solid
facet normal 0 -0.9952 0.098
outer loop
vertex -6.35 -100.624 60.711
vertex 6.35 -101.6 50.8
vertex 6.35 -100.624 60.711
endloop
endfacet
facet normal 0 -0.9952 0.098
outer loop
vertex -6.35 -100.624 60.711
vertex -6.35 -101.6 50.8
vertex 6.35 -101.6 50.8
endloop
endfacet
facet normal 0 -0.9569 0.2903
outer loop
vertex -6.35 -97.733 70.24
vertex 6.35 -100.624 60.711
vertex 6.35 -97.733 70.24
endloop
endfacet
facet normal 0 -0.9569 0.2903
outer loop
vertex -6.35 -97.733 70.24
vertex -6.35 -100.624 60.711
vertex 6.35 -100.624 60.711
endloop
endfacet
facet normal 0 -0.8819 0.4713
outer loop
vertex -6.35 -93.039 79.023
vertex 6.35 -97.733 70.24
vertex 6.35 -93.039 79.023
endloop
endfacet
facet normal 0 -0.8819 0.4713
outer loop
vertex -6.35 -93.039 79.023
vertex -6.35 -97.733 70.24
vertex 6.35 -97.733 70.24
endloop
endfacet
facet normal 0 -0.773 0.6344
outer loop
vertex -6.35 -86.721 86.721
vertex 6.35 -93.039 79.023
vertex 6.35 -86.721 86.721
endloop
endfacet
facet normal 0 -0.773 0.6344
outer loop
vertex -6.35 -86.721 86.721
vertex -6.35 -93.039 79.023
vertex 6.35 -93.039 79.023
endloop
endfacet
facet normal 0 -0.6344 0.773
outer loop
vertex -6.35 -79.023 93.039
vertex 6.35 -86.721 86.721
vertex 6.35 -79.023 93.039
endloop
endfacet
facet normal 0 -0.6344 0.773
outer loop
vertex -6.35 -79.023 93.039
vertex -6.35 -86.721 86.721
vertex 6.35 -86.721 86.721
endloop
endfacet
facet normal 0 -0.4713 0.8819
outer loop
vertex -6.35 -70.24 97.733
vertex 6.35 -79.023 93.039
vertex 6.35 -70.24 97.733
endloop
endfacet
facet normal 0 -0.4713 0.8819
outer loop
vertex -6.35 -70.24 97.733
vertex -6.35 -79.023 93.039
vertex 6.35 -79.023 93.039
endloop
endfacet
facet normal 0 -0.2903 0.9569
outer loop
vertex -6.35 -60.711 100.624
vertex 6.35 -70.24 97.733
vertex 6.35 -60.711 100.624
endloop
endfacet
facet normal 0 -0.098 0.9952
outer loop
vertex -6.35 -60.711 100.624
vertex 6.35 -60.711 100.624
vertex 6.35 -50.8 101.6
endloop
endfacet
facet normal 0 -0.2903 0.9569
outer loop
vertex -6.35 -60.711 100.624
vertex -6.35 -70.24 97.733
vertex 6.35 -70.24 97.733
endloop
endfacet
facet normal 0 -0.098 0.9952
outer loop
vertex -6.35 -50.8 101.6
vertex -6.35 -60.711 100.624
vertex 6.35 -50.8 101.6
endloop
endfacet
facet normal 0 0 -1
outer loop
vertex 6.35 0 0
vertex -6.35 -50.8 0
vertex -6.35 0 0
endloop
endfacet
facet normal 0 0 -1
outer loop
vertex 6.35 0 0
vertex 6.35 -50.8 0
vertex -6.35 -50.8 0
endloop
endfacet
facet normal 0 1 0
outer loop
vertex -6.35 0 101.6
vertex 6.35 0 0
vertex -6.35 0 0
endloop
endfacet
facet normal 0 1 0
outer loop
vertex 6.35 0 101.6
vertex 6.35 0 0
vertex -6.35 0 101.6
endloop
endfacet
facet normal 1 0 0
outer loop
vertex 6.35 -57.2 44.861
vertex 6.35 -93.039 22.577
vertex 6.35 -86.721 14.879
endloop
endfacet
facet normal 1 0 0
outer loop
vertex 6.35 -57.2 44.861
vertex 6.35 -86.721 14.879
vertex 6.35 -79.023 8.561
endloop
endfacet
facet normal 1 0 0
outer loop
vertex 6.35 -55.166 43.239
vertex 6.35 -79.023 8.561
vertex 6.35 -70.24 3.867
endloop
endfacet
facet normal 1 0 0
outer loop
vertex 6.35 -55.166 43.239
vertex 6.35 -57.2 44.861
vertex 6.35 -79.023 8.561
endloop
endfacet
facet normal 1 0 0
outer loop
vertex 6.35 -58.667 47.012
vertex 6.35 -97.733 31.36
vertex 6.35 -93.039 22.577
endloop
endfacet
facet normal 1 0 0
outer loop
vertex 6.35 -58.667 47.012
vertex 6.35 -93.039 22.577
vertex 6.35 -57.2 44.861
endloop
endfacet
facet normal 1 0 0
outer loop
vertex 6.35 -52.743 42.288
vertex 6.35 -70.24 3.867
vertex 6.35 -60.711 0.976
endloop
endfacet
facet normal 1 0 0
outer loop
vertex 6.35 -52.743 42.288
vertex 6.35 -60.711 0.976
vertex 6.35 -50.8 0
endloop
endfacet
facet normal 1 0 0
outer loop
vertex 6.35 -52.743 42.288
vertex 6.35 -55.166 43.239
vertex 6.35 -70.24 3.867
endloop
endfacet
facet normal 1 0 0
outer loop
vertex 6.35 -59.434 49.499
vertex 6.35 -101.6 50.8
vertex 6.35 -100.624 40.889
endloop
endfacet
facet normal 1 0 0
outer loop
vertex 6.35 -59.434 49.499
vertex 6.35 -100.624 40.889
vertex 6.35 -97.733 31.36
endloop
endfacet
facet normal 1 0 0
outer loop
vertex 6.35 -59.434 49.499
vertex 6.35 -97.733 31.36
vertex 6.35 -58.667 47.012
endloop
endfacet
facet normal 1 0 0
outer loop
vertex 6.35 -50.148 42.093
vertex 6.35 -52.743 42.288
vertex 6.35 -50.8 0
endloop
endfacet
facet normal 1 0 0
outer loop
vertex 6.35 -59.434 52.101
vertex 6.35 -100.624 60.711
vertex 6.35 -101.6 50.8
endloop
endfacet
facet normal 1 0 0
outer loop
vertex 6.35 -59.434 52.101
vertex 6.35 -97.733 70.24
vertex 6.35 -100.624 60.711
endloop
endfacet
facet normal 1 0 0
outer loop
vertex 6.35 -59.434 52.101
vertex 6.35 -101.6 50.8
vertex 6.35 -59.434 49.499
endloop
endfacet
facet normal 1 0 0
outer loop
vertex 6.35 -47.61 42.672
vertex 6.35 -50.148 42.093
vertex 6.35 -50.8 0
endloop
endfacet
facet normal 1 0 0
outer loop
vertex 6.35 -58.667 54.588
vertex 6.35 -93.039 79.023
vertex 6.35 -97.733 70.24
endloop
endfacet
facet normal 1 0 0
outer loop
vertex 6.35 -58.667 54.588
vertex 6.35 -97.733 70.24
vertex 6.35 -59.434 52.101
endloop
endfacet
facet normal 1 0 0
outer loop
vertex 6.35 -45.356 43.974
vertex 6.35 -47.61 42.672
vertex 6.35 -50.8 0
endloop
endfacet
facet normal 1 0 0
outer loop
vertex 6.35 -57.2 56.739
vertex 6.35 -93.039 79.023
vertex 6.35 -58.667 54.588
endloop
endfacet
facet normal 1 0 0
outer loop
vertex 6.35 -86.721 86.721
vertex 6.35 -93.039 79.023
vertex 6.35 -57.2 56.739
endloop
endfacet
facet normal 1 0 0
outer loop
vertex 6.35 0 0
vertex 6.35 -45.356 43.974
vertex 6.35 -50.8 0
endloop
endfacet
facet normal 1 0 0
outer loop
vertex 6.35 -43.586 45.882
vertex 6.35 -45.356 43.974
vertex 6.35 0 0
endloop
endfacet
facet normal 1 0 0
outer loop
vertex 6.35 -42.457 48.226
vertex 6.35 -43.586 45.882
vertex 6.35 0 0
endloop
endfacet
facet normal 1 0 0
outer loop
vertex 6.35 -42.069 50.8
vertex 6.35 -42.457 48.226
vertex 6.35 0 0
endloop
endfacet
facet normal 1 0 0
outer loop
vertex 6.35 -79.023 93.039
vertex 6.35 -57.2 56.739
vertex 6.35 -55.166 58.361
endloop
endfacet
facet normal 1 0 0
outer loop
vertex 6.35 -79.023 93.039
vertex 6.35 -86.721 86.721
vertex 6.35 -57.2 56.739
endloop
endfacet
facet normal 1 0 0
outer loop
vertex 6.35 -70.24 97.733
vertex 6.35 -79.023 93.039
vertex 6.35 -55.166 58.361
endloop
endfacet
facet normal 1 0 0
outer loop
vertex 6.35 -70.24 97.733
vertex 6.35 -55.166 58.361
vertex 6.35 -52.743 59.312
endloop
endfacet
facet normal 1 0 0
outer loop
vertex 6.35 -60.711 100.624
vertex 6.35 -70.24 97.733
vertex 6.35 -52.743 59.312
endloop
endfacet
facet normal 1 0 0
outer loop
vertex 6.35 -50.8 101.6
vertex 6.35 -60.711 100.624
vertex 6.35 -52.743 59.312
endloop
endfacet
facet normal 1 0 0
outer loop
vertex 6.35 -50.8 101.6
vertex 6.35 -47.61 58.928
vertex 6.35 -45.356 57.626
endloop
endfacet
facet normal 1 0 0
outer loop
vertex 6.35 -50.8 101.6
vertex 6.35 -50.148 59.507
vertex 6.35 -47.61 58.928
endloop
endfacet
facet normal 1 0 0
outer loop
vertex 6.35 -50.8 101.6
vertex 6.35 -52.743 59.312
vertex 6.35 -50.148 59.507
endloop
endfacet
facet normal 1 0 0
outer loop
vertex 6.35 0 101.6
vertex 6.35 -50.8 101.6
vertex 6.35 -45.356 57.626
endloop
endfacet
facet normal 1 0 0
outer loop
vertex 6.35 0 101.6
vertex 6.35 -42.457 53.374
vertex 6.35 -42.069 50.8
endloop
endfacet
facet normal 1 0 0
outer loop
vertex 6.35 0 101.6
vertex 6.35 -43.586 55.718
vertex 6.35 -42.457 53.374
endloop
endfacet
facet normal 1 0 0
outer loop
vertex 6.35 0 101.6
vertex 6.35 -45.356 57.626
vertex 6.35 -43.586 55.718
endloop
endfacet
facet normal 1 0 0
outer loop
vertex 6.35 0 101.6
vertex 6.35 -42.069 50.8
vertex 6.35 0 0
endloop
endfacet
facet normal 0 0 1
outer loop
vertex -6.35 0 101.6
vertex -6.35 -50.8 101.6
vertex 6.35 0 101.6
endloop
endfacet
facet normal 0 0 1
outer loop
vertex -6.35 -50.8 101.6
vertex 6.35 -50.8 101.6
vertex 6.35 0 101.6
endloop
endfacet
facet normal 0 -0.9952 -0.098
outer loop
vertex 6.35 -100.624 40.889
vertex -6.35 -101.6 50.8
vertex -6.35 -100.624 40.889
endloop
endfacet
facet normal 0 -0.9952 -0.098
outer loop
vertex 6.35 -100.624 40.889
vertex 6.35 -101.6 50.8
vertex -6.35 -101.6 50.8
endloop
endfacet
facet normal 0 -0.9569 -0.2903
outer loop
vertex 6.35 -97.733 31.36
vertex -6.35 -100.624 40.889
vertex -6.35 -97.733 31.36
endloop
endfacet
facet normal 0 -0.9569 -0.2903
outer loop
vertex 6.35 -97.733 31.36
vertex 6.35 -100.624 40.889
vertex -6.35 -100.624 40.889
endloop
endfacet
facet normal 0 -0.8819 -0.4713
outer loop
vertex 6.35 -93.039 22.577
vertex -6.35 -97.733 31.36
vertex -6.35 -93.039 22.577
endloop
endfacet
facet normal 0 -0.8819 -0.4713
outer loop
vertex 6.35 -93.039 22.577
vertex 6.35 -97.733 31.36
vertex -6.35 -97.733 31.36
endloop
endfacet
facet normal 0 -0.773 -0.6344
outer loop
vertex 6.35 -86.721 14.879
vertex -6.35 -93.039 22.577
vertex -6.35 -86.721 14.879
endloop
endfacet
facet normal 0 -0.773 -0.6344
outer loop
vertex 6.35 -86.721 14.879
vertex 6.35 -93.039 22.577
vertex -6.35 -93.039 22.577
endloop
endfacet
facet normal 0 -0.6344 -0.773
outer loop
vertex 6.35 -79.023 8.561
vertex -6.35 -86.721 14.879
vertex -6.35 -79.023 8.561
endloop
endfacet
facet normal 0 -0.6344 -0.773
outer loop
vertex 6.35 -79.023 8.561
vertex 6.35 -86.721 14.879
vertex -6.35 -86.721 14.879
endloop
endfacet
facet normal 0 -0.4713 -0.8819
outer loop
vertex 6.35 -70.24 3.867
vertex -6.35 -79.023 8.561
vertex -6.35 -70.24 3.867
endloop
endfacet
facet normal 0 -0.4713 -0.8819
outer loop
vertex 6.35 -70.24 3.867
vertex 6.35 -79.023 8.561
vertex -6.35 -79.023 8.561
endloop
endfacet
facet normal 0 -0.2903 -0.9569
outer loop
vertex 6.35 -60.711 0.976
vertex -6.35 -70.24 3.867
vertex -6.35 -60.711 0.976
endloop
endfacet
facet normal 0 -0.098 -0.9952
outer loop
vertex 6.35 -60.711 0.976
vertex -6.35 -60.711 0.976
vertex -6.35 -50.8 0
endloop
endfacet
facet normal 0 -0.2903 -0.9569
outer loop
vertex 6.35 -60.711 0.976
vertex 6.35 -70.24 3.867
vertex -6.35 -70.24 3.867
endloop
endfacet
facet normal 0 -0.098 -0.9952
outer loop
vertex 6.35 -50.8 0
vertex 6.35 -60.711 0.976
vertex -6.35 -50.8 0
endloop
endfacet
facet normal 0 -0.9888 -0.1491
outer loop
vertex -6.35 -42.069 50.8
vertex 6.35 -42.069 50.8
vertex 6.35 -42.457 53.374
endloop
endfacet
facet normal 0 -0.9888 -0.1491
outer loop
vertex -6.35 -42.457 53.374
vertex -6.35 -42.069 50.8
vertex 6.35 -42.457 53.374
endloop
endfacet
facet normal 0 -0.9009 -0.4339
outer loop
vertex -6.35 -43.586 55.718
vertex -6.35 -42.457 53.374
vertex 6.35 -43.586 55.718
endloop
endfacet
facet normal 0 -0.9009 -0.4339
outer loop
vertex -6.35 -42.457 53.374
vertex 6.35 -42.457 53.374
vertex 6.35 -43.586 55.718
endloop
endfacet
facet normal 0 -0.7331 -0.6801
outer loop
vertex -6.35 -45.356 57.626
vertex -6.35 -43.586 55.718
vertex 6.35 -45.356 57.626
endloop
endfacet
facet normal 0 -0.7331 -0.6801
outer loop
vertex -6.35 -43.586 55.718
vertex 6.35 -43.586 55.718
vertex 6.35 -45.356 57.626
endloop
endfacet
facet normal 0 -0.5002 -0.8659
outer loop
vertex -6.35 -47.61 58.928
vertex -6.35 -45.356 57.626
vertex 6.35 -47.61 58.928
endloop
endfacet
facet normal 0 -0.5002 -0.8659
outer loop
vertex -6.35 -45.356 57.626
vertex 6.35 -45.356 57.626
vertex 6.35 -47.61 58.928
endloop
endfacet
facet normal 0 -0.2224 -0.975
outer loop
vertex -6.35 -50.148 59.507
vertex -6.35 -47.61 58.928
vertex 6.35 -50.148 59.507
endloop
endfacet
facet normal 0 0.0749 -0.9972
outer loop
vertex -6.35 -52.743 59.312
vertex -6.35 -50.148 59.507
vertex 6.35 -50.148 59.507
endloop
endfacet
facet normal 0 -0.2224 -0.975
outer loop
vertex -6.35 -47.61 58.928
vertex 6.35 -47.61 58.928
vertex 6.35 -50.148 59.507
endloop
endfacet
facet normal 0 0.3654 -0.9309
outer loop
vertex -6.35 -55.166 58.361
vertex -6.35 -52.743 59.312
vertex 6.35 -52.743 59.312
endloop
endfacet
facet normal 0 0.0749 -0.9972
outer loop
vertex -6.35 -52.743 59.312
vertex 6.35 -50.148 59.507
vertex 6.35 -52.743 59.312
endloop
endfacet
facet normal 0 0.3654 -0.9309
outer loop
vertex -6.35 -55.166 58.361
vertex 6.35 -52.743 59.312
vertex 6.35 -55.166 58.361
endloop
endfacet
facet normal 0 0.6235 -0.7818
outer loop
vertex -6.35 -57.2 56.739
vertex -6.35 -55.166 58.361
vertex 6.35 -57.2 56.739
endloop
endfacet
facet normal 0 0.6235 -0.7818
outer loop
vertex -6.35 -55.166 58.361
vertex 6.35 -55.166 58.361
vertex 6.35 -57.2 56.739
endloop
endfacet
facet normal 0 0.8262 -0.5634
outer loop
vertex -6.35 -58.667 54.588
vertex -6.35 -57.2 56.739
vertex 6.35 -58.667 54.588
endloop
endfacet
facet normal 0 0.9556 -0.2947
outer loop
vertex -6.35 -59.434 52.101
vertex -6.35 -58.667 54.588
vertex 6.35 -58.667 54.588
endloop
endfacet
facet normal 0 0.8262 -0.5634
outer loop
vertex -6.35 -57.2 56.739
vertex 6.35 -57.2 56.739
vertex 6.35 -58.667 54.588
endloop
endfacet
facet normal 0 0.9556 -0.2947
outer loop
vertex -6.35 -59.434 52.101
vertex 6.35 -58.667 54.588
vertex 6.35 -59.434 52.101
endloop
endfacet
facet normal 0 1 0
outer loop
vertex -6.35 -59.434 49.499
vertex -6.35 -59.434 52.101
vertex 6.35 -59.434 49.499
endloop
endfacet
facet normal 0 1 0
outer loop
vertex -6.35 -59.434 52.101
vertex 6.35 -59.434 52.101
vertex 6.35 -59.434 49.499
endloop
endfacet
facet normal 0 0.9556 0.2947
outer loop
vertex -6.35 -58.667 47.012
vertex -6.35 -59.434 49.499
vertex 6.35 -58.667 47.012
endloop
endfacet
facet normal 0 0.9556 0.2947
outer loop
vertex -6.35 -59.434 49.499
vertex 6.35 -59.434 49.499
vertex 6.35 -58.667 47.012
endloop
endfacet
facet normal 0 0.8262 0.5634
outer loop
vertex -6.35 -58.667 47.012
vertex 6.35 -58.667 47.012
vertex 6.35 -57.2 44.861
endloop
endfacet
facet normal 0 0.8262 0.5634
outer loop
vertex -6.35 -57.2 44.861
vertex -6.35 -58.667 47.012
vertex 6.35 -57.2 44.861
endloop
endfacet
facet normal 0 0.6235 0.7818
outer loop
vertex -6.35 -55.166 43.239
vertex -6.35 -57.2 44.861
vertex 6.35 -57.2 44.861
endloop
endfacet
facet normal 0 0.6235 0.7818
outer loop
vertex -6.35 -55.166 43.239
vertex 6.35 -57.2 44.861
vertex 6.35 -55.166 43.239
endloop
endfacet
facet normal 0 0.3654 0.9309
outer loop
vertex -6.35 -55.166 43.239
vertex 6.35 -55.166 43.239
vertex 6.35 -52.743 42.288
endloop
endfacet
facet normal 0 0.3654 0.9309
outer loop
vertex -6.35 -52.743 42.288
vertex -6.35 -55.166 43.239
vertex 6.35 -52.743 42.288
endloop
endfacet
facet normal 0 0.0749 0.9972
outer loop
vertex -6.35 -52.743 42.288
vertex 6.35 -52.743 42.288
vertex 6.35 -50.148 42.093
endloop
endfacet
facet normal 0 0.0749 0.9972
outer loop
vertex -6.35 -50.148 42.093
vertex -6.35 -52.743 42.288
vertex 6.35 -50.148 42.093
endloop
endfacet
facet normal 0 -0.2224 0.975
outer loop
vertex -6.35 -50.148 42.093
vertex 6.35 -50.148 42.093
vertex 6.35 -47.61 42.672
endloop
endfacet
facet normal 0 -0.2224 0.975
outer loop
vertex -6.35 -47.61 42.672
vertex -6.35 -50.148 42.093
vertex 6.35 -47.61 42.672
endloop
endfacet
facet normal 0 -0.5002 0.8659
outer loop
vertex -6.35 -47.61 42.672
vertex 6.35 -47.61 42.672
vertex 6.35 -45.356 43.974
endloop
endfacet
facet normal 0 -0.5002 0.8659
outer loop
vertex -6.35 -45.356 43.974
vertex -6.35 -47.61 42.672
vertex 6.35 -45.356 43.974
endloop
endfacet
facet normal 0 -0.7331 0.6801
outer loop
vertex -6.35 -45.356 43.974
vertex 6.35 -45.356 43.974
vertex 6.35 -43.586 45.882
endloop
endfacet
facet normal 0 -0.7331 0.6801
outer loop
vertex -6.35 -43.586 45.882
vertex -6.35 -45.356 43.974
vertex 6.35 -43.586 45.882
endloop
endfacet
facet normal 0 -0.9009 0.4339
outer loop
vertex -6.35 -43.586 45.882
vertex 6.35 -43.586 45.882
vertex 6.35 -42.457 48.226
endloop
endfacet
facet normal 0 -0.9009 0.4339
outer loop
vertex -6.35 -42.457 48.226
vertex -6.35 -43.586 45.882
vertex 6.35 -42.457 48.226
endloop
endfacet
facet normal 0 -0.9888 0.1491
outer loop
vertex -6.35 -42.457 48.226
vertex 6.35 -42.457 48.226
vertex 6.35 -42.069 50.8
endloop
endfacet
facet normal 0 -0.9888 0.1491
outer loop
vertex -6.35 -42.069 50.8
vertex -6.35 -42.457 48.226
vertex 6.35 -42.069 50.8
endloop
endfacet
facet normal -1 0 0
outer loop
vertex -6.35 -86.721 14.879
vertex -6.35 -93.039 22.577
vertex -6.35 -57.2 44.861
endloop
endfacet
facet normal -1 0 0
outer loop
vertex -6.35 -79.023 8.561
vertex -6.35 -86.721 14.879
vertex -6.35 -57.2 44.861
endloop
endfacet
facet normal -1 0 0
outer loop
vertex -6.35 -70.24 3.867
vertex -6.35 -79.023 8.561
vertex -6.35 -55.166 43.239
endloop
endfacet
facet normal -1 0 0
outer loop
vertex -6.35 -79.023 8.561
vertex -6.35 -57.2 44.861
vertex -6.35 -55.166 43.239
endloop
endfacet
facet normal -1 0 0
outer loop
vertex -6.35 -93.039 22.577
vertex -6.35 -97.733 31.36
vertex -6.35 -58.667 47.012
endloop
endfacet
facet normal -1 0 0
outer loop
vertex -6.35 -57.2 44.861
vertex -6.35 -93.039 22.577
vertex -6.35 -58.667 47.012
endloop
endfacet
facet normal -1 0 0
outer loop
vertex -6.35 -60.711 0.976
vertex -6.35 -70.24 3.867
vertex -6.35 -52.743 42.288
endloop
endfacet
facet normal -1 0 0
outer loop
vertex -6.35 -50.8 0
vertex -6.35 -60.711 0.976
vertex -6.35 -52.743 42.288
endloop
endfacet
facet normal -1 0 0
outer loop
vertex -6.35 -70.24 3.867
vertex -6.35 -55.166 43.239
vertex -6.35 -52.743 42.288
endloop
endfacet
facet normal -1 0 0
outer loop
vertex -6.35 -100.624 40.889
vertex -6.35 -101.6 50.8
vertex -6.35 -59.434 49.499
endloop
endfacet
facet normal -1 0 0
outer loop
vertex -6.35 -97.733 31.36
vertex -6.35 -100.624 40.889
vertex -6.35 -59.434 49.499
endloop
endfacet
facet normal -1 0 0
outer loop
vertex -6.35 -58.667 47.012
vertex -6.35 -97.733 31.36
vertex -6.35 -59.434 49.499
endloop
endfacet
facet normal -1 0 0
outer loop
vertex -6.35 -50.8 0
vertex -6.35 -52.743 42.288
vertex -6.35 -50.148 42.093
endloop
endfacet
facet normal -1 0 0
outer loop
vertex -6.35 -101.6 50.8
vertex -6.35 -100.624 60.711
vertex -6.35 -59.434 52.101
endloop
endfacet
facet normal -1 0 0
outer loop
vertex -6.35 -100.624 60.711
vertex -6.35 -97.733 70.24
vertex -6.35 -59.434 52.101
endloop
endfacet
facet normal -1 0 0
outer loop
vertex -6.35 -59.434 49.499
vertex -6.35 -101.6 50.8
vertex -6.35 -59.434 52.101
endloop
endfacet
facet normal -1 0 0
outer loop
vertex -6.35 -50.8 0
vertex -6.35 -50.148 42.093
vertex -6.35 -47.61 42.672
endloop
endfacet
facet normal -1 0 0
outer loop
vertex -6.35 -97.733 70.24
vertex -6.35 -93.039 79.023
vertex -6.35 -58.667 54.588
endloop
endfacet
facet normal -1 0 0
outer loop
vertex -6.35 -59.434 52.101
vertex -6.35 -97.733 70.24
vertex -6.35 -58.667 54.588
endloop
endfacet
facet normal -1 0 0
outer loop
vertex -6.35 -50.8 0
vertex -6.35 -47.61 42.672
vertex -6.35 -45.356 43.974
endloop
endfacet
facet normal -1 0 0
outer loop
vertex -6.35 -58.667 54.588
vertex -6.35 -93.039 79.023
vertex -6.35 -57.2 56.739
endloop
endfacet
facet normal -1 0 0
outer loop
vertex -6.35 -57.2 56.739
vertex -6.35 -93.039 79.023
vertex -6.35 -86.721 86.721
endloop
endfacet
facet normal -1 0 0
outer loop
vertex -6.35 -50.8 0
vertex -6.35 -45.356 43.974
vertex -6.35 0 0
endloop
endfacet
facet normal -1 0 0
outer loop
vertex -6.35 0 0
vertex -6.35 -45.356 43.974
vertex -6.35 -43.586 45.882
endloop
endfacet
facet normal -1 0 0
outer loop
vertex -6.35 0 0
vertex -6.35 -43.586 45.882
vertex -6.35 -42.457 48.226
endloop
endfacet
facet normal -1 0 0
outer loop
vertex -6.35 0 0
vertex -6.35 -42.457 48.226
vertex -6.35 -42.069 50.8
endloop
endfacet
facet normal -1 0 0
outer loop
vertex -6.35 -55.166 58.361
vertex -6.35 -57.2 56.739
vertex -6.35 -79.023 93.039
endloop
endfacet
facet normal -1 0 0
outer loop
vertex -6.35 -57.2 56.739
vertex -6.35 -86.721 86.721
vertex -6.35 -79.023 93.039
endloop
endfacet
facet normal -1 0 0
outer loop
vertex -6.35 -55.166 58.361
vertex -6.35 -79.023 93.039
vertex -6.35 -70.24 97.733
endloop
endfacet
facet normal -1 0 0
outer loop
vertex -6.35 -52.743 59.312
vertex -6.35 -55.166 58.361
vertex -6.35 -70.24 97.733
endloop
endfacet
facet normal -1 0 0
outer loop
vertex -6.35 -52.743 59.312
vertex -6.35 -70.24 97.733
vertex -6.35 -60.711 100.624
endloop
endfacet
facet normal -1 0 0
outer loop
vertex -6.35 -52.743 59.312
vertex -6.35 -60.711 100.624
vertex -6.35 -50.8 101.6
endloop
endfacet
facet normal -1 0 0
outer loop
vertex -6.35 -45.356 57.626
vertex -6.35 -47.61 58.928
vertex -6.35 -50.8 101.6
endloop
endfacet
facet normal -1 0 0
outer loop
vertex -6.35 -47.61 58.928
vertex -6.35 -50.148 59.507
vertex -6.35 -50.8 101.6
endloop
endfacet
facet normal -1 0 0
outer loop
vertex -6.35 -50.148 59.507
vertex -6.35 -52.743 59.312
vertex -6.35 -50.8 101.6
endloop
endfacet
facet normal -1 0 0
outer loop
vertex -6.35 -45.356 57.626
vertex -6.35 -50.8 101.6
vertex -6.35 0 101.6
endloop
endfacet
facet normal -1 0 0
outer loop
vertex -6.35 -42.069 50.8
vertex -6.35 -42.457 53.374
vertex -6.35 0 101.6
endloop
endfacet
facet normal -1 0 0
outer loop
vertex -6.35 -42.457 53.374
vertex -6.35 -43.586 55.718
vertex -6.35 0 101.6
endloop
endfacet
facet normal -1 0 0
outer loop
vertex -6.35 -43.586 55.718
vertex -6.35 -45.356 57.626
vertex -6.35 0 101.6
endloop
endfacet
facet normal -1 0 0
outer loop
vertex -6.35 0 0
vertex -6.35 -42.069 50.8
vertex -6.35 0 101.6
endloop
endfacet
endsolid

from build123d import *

# Parameters (mm, degrees)
F0_W     = 101.6
F0_H     = 101.6
F1_DEPTH = 6.35
F2_R     = 50.79999
F3_R     = 8.73125
F4_DEPTH = 25.4


# Not quite as in the source:
# - a fillet or chamfer is up to 0.001 mm smaller than in the source, because OpenCascade refuses the exact size


with BuildPart() as f1:
    # F0 (on Right) → F1 (new body, symmetric)
    with BuildSketch(Plane.YZ):
        with Locations((-50.8, 50.8)):
            Rectangle(F0_W, F0_H)
    extrude(amount=F1_DEPTH, both=True)

    # F2 (radius 50.8 in the source; OpenCascade refuses exactly that, so slightly less here)
    f2_edges = [f1.edges().sort_by_distance(p)[0] for p in [
        (0, -101.6, 101.6),
        (0, -101.6, 0),
    ]]
    fillet(f2_edges, radius=F2_R)

    # F3 (on face) → F4 (cut)
    with BuildSketch(Plane.YZ.offset(6.35)):
        with Locations((-50.8, 50.8)):
            Circle(F3_R)
    extrude(amount=-F4_DEPTH, mode=Mode.SUBTRACT)


solid = f1.part
